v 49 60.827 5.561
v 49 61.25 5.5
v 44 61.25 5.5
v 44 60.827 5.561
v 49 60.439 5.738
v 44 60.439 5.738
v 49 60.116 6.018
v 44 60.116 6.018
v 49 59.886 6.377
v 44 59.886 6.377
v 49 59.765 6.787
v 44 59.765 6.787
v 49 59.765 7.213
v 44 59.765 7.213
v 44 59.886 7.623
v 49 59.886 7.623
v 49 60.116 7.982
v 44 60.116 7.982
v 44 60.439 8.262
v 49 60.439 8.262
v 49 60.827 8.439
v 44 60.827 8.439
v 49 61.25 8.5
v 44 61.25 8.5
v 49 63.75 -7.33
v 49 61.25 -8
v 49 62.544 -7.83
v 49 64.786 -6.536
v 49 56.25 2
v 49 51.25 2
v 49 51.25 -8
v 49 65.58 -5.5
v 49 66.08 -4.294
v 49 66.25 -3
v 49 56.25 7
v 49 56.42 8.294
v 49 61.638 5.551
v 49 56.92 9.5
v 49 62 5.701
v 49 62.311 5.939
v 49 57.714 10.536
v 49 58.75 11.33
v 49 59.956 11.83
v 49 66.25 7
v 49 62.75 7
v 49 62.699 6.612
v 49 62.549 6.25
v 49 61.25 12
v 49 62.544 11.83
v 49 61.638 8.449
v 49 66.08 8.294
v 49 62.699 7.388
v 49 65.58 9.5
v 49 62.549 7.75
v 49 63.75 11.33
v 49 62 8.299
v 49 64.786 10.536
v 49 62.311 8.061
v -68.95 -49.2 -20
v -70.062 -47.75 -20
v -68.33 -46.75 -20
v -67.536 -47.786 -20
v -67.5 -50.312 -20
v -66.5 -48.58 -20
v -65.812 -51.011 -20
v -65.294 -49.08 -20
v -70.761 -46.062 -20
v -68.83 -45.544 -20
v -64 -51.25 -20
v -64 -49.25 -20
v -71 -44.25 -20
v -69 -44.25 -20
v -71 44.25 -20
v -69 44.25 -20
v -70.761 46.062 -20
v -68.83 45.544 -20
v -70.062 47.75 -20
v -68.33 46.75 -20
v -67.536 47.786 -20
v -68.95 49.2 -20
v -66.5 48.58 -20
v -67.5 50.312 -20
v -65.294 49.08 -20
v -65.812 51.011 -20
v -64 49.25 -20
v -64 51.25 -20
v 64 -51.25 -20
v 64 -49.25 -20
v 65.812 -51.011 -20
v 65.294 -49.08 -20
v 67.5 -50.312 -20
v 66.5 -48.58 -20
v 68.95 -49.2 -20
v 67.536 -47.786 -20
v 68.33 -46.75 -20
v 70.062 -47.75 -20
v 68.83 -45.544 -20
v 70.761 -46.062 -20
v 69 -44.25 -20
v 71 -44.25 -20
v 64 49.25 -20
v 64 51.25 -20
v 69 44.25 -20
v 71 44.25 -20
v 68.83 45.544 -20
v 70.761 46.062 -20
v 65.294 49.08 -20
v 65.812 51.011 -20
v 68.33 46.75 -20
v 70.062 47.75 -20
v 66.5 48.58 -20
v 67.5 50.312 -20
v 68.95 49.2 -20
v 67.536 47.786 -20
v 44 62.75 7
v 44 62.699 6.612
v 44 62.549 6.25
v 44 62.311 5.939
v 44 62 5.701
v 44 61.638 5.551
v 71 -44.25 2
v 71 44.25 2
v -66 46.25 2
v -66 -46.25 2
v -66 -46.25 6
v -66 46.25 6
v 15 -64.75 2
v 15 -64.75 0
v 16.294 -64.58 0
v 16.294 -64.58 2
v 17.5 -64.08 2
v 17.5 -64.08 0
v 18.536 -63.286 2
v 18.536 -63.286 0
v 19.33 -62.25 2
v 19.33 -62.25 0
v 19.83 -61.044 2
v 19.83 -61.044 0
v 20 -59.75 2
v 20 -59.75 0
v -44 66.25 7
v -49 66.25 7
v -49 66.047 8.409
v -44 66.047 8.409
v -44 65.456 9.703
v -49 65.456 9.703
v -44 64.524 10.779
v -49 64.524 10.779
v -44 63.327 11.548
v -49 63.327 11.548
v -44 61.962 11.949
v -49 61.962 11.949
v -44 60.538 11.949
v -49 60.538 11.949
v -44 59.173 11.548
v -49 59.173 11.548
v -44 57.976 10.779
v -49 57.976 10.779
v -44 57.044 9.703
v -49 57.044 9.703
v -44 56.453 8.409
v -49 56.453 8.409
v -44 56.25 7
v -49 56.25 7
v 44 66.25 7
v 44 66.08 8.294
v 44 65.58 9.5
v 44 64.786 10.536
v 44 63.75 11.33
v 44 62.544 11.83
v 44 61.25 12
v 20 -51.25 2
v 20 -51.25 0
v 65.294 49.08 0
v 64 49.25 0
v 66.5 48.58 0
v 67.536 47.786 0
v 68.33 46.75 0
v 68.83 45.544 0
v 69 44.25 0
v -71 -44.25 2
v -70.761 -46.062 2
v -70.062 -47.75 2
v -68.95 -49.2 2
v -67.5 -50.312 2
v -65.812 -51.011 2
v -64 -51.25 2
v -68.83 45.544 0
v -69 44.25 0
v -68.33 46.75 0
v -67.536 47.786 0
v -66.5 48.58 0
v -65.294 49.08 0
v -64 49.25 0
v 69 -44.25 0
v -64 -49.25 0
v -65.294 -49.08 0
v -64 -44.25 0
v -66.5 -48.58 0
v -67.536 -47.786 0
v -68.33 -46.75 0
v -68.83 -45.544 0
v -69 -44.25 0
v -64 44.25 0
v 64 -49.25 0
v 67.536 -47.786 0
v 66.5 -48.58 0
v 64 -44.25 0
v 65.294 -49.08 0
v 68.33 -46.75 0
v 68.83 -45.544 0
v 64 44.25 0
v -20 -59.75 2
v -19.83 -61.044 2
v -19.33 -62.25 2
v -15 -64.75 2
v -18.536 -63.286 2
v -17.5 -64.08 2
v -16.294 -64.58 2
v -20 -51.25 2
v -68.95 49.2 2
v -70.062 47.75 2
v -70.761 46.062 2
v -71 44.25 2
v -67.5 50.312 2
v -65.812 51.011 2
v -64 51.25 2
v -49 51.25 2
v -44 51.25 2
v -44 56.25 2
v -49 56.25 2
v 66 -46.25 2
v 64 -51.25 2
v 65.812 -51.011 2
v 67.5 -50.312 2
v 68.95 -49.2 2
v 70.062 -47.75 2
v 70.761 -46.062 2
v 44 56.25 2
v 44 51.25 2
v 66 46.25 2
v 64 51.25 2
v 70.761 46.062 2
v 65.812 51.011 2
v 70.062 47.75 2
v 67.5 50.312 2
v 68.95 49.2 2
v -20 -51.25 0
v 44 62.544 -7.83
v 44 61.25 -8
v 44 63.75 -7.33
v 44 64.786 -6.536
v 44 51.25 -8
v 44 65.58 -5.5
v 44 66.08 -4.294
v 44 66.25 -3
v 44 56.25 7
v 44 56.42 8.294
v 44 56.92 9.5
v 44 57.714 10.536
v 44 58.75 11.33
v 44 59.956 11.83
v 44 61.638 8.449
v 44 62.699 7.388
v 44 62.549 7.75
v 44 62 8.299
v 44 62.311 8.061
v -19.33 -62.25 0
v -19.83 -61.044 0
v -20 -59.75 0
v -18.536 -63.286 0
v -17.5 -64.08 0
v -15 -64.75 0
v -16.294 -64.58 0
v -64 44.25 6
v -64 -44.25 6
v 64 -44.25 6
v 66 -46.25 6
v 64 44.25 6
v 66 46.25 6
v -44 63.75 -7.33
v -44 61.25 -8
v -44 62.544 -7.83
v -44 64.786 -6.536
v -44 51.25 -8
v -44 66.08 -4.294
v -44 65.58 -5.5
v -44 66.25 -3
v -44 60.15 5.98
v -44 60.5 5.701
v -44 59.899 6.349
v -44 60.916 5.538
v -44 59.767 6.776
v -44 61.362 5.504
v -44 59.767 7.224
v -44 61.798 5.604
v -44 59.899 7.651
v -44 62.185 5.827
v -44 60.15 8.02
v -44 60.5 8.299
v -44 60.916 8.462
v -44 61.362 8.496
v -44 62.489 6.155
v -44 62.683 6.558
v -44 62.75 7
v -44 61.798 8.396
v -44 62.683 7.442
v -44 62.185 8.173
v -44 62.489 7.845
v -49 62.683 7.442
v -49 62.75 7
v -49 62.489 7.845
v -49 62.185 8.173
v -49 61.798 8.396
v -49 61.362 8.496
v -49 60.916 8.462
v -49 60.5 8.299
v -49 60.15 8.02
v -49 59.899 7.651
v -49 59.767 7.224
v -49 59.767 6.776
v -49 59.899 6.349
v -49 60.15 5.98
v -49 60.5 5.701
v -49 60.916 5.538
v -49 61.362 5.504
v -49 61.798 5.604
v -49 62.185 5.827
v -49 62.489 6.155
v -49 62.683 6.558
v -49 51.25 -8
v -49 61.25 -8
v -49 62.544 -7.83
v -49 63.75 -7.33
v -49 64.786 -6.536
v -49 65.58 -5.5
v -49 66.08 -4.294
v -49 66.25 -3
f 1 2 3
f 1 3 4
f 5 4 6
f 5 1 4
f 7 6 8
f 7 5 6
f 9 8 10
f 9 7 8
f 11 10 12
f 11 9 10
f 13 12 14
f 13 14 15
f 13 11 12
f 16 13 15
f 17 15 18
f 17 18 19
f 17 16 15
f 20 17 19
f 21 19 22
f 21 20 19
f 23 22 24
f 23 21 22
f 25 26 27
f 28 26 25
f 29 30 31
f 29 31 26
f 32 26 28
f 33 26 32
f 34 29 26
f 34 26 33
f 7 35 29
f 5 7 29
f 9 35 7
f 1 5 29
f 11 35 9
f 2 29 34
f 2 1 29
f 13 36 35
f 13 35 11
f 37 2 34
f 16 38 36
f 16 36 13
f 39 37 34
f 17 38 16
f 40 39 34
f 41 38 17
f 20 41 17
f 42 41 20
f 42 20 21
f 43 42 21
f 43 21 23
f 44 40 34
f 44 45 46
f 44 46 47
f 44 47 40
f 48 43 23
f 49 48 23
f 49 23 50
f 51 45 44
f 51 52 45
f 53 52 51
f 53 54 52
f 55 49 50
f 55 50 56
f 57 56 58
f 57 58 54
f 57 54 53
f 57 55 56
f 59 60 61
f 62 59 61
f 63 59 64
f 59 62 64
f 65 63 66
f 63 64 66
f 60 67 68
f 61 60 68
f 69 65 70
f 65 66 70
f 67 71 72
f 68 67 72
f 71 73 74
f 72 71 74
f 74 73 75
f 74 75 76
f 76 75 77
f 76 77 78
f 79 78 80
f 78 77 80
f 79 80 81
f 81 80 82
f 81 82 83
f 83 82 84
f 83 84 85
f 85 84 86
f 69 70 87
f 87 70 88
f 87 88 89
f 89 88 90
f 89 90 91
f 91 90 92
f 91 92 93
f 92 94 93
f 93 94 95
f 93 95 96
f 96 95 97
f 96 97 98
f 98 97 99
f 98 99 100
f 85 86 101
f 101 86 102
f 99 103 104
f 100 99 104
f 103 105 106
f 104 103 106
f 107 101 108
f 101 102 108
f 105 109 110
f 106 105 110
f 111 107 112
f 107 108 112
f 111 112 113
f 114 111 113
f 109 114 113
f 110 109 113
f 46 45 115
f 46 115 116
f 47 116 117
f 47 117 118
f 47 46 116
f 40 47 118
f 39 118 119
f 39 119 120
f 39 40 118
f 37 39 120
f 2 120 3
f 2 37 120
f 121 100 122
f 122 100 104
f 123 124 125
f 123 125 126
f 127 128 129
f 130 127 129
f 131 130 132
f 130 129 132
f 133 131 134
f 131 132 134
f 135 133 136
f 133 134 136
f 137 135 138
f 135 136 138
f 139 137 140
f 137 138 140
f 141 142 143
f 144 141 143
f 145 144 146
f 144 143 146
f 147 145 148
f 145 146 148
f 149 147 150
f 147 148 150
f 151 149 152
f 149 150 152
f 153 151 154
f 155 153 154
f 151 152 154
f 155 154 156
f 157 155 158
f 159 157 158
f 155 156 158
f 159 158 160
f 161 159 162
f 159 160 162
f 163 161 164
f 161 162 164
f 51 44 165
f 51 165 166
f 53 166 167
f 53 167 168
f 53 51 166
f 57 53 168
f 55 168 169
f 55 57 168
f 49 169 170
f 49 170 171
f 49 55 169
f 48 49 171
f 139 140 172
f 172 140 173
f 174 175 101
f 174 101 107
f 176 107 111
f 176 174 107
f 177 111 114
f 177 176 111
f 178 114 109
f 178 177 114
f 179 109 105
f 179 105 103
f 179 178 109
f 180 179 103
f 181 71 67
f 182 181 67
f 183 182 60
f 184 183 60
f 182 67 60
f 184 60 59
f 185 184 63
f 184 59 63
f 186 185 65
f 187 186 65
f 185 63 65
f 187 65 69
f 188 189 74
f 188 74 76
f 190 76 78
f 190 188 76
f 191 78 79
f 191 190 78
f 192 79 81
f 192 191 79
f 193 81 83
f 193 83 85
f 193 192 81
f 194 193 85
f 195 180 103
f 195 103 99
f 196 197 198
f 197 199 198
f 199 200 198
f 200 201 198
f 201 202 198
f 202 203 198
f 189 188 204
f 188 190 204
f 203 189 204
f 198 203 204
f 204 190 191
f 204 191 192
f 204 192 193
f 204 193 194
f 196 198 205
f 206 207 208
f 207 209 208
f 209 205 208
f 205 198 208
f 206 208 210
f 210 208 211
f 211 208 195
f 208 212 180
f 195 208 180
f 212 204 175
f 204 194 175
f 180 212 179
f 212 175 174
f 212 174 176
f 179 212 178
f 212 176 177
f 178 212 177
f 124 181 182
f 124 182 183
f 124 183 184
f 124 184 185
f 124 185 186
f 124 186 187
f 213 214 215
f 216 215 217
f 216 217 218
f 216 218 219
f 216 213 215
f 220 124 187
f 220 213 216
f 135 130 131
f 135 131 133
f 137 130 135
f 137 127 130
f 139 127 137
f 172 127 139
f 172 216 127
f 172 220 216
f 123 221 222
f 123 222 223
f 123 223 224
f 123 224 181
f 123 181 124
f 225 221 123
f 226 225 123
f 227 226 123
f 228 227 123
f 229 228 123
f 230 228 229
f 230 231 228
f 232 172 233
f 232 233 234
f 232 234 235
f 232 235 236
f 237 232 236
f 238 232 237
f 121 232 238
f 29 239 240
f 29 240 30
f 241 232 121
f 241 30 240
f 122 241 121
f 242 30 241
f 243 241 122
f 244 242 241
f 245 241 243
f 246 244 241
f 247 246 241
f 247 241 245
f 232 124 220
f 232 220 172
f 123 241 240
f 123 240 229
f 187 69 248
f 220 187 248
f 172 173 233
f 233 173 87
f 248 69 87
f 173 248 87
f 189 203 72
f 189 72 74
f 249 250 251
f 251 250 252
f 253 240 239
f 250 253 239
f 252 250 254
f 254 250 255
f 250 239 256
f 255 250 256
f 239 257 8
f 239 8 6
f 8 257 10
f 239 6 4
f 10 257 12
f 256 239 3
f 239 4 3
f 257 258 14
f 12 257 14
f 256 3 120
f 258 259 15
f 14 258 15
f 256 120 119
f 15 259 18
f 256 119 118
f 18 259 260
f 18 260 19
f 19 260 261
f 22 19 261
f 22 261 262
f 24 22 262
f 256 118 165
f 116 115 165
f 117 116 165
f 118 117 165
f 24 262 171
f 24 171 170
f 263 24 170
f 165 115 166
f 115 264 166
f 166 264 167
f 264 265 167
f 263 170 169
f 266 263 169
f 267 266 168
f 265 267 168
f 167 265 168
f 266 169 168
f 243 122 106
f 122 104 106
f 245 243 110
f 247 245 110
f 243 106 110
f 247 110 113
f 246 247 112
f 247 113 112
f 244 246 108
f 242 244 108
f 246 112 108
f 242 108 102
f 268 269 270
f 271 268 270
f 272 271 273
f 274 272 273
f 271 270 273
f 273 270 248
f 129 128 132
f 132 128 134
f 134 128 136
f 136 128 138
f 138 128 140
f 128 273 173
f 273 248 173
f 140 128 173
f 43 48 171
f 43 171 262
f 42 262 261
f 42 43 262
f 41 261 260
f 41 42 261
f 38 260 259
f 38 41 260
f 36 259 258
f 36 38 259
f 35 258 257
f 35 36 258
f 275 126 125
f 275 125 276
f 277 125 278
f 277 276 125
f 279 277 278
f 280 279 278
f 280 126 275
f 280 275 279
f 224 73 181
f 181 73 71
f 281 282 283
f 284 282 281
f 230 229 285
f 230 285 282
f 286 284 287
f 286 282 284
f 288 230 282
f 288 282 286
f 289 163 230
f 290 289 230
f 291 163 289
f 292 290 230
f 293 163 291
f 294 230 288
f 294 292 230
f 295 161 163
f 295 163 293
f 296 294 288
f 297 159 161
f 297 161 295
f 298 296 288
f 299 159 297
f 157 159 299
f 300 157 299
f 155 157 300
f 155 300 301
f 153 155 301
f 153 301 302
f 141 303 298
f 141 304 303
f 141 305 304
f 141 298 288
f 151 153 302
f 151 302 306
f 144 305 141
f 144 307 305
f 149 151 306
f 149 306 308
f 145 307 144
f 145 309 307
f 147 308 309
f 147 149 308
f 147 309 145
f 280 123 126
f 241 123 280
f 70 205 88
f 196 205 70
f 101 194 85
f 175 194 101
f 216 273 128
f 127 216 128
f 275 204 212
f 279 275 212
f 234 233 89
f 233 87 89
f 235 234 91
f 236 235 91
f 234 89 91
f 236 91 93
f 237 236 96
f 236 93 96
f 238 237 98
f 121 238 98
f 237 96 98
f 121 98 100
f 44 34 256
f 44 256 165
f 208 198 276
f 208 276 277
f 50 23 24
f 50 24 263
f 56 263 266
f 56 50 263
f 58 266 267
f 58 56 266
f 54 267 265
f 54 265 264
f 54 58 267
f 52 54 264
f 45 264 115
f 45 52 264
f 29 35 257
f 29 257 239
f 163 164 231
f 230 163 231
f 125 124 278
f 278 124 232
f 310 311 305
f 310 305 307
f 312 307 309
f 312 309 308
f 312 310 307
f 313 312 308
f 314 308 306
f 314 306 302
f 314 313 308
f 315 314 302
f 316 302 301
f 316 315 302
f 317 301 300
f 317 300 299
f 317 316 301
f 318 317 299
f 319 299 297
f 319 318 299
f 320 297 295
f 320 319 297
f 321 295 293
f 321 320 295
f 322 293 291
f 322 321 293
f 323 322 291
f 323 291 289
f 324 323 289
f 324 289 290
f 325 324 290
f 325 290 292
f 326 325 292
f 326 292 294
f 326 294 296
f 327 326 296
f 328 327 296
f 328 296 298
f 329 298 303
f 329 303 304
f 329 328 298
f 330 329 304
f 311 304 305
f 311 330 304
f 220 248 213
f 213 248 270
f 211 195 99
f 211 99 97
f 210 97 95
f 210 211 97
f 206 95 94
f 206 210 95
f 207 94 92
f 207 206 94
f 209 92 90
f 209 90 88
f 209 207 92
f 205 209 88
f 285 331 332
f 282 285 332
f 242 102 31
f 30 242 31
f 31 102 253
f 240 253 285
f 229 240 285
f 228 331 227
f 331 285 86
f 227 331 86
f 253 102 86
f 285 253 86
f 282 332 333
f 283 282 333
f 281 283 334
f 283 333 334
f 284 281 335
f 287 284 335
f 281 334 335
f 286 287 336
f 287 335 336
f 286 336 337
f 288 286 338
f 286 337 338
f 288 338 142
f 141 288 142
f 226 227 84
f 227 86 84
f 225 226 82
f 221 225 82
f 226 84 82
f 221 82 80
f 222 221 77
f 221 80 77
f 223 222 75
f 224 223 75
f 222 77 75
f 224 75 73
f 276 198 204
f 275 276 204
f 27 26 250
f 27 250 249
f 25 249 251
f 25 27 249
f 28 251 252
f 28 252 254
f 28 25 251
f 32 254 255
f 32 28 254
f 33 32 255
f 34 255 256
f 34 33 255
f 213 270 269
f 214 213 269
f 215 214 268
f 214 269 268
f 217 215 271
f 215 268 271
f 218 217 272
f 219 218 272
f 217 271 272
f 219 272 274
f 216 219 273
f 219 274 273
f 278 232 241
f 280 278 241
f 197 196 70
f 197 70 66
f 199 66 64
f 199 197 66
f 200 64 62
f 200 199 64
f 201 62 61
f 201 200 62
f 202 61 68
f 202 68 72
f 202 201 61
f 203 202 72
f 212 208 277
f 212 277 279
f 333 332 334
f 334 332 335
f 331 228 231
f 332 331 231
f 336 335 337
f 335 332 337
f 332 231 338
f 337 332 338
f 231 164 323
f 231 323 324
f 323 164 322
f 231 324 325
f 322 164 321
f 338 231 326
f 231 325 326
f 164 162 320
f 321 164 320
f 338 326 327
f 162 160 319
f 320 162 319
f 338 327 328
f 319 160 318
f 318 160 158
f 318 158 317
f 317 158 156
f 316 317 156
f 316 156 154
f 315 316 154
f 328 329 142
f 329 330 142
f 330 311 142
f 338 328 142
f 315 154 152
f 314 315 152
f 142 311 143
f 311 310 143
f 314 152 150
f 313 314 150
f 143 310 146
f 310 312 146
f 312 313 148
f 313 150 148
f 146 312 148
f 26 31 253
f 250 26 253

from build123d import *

# Parameters (mm, degrees)
F1_DEPTH  = 20
F0_W      = 132
F0_H      = 92.5
F2_DEPTH  = 2
F0_W_2    = 128
F0_H_2    = 88.5
F3_DEPTH  = 6
F4_W      = 5
F4_H      = 10
F5_DEPTH  = 10
F7_DEPTH  = 5
F9_R      = 1.5
F10_DEPTH = 5


with BuildPart() as f1:
    # F0 (on Top) → F1 (new body)
    with BuildSketch(Plane.XY):
        with BuildLine():
            Line((71, -44.25), (71, 44.25))
            ThreePointArc((71, 44.25), (68.949747, 49.199747), (64, 51.25))
            Line((64, 51.25), (-64, 51.25))
            ThreePointArc((-64, 51.25), (-68.949747, 49.199747), (-71, 44.25))
            Line((-71, 44.25), (-71, -44.25))
            ThreePointArc((-71, -44.25), (-68.949747, -49.199747), (-64, -51.25))
            Line((-64, -51.25), (-20, -51.25))
            Line((-20, -51.25), (20, -51.25))
            Line((20, -51.25), (64, -51.25))
            ThreePointArc((64, -51.25), (68.949747, -49.199747), (71, -44.25))
        make_face()
        with BuildLine():
            Line((-64, 49.25), (64, 49.25))
            ThreePointArc((64, 49.25), (67.535534, 47.785534), (69, 44.25))
            Line((69, 44.25), (69, -44.25))
            ThreePointArc((69, -44.25), (67.535534, -47.785534), (64, -49.25))
            Line((64, -49.25), (-64, -49.25))
            ThreePointArc((-64, -49.25), (-67.535534, -47.785534), (-69, -44.25))
            Line((-69, -44.25), (-69, 44.25))
            ThreePointArc((-69, 44.25), (-67.535534, 47.785534), (-64, 49.25))
        make_face(mode=Mode.SUBTRACT)
    extrude(amount=-F1_DEPTH)

    # F0 (on Top) → F2 (join)
    with BuildSketch(Plane.XY):
        with BuildLine():
            Line((20, -59.75), (20, -51.25))
            Line((20, -51.25), (-20, -51.25))
            Line((-20, -51.25), (-20, -59.75))
            ThreePointArc((-20, -59.75), (-18.535534, -63.285534), (-15, -64.75))
            Line((-15, -64.75), (15, -64.75))
            ThreePointArc((15, -64.75), (18.535534, -63.285534), (20, -59.75))
        make_face()
        with BuildLine():
            Line((71, -44.25), (71, 44.25))
            ThreePointArc((71, 44.25), (68.949747, 49.199747), (64, 51.25))
            Line((64, 51.25), (-64, 51.25))
            ThreePointArc((-64, 51.25), (-68.949747, 49.199747), (-71, 44.25))
            Line((-71, 44.25), (-71, -44.25))
            ThreePointArc((-71, -44.25), (-68.949747, -49.199747), (-64, -51.25))
            Line((-64, -51.25), (-20, -51.25))
            Line((-20, -51.25), (20, -51.25))
            Line((20, -51.25), (64, -51.25))
            ThreePointArc((64, -51.25), (68.949747, -49.199747), (71, -44.25))
        make_face()
        with BuildLine():
            Line((-64, 49.25), (64, 49.25))
            ThreePointArc((64, 49.25), (67.535534, 47.785534), (69, 44.25))
            Line((69, 44.25), (69, -44.25))
            ThreePointArc((69, -44.25), (67.535534, -47.785534), (64, -49.25))
            Line((64, -49.25), (-64, -49.25))
            ThreePointArc((-64, -49.25), (-67.535534, -47.785534), (-69, -44.25))
            Line((-69, -44.25), (-69, 44.25))
            ThreePointArc((-69, 44.25), (-67.535534, 47.785534), (-64, 49.25))
        make_face(mode=Mode.SUBTRACT)
        with BuildLine():
            ThreePointArc((69, 44.25), (67.535534, 47.785534), (64, 49.25))
            Line((64, 49.25), (-64, 49.25))
            ThreePointArc((-64, 49.25), (-67.535534, 47.785534), (-69, 44.25))
            Line((-69, 44.25), (-69, -44.25))
            ThreePointArc((-69, -44.25), (-67.535534, -47.785534), (-64, -49.25))
            Line((-64, -49.25), (64, -49.25))
            ThreePointArc((64, -49.25), (67.535534, -47.785534), (69, -44.25))
            Line((69, -44.25), (69, 44.25))
        make_face()
        Rectangle(F0_W, F0_H, mode=Mode.SUBTRACT)
    extrude(amount=F2_DEPTH)

    # F0 (on Top) → F3 (join)
    with BuildSketch(Plane.XY):
        Rectangle(F0_W, F0_H)
        Rectangle(F0_W_2, F0_H_2, mode=Mode.SUBTRACT)
    extrude(amount=F3_DEPTH)

    # F4 (on face) → F5 (join)
    with BuildSketch(Plane(origin=(0, 51.25, 0), x_dir=(-1, 0, 0), z_dir=(0, 1, 0))):
        with Locations((-46.5, -3)):
            Rectangle(F4_W, F4_H)
    extrude(amount=F5_DEPTH)

    # F6 (on face) → F7 (join)
    with BuildSketch(Plane.YZ.offset(49)):
        with BuildLine():
            Line((61.25, 2), (61.25, -8))
            ThreePointArc((61.25, -8), (64.785534, -6.535534), (66.25, -3))
            Line((66.25, -3), (66.25, 7))
            ThreePointArc((66.25, 7), (64.785534, 10.535534), (61.25, 12))
            Line((61.25, 12), (61.25, 8.5))
            ThreePointArc((61.25, 8.5), (62.31066, 8.06066), (62.75, 7))
            ThreePointArc((62.75, 7), (62.31066, 5.93934), (61.25, 5.5))
            Line((61.25, 5.5), (61.25, 2))
        make_face()
        with BuildLine():
            Line((56.25, 2), (61.25, 2))
            Line((61.25, 2), (61.25, 5.5))
            ThreePointArc((61.25, 5.5), (59.75, 7), (61.25, 8.5))
            Line((61.25, 8.5), (61.25, 12))
            ThreePointArc((61.25, 12), (57.714466, 10.535534), (56.25, 7))
            Line((56.25, 7), (56.25, 2))
        make_face()
    extrude(amount=-F7_DEPTH)

    # F9 (on offset) → F10 (join)
    with BuildSketch(Plane.YZ.offset(-49)):
        with BuildLine():
            Line((56.25, 2), (51.25, 2))
            Line((51.25, 2), (51.25, -8))
            Line((51.25, -8), (61.25, -8))
            ThreePointArc((61.25, -8), (64.785534, -6.535534), (66.25, -3))
            Line((66.25, -3), (66.25, 7))
            ThreePointArc((66.25, 7), (61.25, 12), (56.25, 7))
            Line((56.25, 7), (56.25, 2))
        make_face()
        with Locations((61.25, 7)):
            Circle(F9_R, mode=Mode.SUBTRACT)
    extrude(amount=F10_DEPTH)


solid = f1.part
